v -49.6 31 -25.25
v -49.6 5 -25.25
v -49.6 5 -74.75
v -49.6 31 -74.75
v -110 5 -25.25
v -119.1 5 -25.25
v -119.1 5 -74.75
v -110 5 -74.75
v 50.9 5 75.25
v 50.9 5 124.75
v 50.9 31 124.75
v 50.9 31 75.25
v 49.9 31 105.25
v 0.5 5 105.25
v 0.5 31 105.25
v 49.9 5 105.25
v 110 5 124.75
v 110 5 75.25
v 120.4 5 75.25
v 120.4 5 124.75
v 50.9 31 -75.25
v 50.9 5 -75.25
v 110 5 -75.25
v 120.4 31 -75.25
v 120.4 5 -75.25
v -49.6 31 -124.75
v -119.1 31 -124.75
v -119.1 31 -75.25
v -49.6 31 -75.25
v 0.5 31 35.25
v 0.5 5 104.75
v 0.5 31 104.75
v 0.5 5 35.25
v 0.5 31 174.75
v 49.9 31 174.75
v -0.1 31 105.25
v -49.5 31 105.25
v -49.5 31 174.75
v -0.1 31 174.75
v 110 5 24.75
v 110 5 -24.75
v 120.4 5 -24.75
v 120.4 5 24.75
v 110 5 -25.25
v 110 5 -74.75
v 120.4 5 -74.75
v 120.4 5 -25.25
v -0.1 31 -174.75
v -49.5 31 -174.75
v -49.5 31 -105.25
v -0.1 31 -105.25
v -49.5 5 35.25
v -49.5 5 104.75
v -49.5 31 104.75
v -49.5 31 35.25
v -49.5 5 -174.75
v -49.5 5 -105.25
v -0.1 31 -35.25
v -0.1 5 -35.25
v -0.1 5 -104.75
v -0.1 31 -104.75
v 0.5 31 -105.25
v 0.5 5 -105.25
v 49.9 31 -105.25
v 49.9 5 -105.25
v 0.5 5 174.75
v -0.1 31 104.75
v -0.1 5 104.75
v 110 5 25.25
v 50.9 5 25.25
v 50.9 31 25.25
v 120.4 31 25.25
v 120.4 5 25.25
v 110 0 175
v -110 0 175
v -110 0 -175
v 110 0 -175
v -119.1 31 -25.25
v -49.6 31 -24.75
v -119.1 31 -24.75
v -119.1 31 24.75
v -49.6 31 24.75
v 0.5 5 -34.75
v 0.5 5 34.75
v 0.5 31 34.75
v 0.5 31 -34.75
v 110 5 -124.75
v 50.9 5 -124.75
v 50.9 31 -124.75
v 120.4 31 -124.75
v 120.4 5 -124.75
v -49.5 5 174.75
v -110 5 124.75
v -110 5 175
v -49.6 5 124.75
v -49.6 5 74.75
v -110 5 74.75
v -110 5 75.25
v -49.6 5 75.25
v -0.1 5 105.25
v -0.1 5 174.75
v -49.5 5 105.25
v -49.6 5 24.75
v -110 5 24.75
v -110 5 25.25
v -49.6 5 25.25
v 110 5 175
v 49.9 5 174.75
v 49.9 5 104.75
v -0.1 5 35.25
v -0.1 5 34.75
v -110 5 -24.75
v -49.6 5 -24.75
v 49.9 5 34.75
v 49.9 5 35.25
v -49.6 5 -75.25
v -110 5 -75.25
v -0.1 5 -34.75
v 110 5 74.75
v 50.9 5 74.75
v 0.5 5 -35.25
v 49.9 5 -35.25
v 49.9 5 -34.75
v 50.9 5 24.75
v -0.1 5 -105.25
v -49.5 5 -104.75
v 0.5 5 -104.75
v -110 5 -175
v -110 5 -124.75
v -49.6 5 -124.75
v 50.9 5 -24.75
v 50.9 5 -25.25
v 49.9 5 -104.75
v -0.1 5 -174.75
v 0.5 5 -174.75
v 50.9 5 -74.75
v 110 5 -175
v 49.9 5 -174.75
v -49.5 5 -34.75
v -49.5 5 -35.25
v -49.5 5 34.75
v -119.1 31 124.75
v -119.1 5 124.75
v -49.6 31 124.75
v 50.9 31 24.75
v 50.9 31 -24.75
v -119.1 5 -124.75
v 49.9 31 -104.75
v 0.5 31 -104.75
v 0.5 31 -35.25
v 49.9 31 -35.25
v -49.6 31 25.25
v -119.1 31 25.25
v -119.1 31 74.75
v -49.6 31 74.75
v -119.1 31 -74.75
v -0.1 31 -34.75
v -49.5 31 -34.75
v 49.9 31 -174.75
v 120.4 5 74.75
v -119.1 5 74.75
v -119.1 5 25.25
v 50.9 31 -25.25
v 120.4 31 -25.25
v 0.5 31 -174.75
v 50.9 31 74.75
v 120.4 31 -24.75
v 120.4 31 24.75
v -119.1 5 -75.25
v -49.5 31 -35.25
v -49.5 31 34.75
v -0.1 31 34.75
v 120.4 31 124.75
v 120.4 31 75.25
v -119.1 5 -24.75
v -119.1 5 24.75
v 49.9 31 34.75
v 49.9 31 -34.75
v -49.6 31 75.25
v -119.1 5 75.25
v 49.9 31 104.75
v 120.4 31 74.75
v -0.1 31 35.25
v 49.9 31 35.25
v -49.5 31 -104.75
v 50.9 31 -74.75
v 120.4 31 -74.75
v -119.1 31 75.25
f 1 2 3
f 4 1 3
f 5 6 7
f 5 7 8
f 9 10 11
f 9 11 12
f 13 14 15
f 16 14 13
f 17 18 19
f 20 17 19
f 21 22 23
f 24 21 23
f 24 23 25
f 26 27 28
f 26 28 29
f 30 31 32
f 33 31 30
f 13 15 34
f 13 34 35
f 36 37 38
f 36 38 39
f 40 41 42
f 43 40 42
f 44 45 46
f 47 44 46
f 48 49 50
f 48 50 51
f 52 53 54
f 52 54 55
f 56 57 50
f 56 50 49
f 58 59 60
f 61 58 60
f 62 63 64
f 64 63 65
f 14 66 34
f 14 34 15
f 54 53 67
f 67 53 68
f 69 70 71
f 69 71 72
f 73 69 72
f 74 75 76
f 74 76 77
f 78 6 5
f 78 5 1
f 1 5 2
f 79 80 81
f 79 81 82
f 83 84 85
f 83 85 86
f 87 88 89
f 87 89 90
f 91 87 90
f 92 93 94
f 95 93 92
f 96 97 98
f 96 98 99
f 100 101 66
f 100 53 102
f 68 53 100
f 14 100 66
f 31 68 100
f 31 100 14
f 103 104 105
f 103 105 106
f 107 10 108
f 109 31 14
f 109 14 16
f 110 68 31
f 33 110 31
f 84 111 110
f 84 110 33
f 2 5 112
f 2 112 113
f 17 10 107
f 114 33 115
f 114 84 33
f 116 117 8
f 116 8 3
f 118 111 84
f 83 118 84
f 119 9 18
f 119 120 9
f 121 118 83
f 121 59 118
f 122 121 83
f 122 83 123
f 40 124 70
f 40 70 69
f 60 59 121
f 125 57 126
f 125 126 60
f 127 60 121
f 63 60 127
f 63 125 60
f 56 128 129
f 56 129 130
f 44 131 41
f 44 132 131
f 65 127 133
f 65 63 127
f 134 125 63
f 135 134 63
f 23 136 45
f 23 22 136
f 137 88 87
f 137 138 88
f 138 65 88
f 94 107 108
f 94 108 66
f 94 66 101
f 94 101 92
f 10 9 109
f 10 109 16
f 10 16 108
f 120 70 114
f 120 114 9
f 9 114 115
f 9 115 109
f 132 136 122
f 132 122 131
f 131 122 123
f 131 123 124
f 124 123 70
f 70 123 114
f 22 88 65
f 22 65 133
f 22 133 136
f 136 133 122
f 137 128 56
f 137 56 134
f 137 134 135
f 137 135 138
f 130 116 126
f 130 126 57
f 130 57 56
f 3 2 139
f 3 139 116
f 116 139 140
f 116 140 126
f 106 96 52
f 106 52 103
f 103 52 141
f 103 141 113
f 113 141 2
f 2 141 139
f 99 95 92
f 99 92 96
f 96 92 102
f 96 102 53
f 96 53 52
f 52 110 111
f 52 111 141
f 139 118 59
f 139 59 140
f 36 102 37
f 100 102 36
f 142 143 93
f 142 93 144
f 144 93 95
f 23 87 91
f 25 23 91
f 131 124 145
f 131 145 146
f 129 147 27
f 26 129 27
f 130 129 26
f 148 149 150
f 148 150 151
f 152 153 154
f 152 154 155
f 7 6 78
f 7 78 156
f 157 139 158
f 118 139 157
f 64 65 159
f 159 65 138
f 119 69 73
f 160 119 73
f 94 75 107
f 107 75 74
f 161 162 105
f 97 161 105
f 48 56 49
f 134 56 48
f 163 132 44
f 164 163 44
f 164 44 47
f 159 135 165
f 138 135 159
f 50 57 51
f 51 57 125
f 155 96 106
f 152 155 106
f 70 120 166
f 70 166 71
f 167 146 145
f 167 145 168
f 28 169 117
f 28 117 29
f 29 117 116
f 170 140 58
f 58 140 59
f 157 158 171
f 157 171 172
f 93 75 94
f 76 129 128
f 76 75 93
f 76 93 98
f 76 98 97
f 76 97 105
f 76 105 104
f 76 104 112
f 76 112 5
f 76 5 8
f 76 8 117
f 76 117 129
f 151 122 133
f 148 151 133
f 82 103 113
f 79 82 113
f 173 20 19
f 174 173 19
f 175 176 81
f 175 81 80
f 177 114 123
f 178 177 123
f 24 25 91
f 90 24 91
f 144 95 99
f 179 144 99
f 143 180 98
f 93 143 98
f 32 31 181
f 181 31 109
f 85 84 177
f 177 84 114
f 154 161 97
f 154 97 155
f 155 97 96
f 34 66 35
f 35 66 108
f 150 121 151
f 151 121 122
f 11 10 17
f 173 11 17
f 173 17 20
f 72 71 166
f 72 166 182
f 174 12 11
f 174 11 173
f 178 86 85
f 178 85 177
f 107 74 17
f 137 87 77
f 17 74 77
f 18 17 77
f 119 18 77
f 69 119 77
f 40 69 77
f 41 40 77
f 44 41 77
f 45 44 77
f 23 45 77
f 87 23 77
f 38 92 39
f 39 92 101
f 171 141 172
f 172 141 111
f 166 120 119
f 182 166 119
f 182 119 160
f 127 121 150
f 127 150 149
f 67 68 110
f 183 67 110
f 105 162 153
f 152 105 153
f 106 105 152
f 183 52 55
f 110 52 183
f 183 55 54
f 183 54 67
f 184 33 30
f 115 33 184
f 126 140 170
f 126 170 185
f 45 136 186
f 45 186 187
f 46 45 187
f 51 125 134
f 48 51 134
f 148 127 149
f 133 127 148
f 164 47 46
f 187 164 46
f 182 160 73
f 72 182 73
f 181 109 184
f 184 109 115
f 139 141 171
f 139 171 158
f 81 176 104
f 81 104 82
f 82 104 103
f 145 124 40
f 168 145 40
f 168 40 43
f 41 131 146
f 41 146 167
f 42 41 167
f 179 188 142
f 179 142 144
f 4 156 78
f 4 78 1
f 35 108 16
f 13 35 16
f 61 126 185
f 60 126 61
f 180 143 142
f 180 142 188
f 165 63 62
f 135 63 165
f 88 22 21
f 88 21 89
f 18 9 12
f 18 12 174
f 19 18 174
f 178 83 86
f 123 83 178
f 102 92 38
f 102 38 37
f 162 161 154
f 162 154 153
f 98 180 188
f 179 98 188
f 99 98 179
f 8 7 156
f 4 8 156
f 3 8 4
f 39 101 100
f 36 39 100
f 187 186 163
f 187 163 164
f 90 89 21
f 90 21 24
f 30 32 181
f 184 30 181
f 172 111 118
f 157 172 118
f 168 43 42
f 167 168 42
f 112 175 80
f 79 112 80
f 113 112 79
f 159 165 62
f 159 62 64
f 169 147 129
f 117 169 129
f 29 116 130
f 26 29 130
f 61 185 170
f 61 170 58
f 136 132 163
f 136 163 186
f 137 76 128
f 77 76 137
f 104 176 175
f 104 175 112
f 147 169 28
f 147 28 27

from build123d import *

# Parameters (mm, degrees)
SKETCH1_W                     = 220
SKETCH1_H                     = 350
BOSS_EXTRUDE1_DEPTH           = 5
SKETCH2_W                     = 49.4
SKETCH2_H                     = 69.5
BOSS_EXTRUDE2_DEPTH           = 26
LPATTERN1_COUNT               = 2
LPATTERN1_PITCH               = 50
LPATTERN3_COUNT               = 3
LPATTERN3_PITCH               = 70
LPATTERN3_COPY_1_SKETCH_W     = 49.4
LPATTERN3_COPY_1_SKETCH_H     = 69.5
LPATTERN3_COPY_1_DEPTH        = 26
LPATTERN3_COPY_2_SKETCH_W     = 49.4
LPATTERN3_COPY_2_SKETCH_H     = 69.5
LPATTERN3_COPY_2_DEPTH        = 26
LPATTERN3_COL_COUNT           = 3
LPATTERN3_COL_PITCH           = 70
LPATTERN3_COL_COPY_1_SKETCH_W = 49.4
LPATTERN3_COL_COPY_1_SKETCH_H = 69.5
LPATTERN3_COL_COPY_1_DEPTH    = 26
LPATTERN3_COL_COPY_2_SKETCH_W = 49.4
LPATTERN3_COL_COPY_2_SKETCH_H = 69.5
LPATTERN3_COL_COPY_2_DEPTH    = 26
SKETCH4_W                     = 69.5
SKETCH4_H                     = 49.5
BOSS_EXTRUDE3_DEPTH           = 26
LPATTERN4_COUNT               = 3
LPATTERN4_PITCH               = 50
LPATTERN4_COL_COUNT           = 3
LPATTERN4_COL_PITCH           = 50
LPATTERN5_COUNT               = 2
LPATTERN5_PITCH               = 170
LPATTERN5_COPY_1_SKETCH_W     = 69.5
LPATTERN5_COPY_1_SKETCH_H     = 49.5
LPATTERN5_COPY_1_DEPTH        = 26
LPATTERN5_COPY_2_SKETCH_W     = 69.5
LPATTERN5_COPY_2_SKETCH_H     = 49.5
LPATTERN5_COPY_2_DEPTH        = 26
LPATTERN5_COPY_3_SKETCH_W     = 69.5
LPATTERN5_COPY_3_SKETCH_H     = 49.5
LPATTERN5_COPY_3_DEPTH        = 26
LPATTERN5_COPY_4_SKETCH_W     = 69.5
LPATTERN5_COPY_4_SKETCH_H     = 49.5
LPATTERN5_COPY_4_DEPTH        = 26


with BuildPart() as part:
    # Sketch1 → Boss-Extrude1 (new body)
    with BuildSketch(Plane(origin=(0, 0, 0), x_dir=(1, 0, 0), z_dir=(0, 1, 0))):
        Rectangle(SKETCH1_W, SKETCH1_H)
    extrude(amount=BOSS_EXTRUDE1_DEPTH)

    # Sketch2 → Boss-Extrude2 (add)
    with BuildSketch(Plane(origin=(0, 5, 0), x_dir=(1, 0, 0), z_dir=(0, 1, 0))):
        with Locations((-24.8, 0)):
            Rectangle(SKETCH2_W, SKETCH2_H)
    boss_extrude2 = extrude(amount=BOSS_EXTRUDE2_DEPTH)

    # LPattern1: Boss-Extrude2 ×2
    with Locations(*[(i * LPATTERN1_PITCH, 0, 0) for i in range(1, LPATTERN1_COUNT)]):
        add(boss_extrude2)

    # LPattern3: Boss-Extrude2 ×3
    with Locations(*[(0, 0, -i * LPATTERN3_PITCH) for i in range(1, LPATTERN3_COUNT)]):
        add(boss_extrude2)

    # LPattern3 copy 1 sketch → LPattern3 copy 1 (add)
    with BuildSketch(Plane(origin=(50, 5, -70), x_dir=(1, 0, 0), z_dir=(0, 1, 0))):
        with Locations((-24.8, 0)):
            Rectangle(LPATTERN3_COPY_1_SKETCH_W, LPATTERN3_COPY_1_SKETCH_H)
    extrude(amount=LPATTERN3_COPY_1_DEPTH)

    # LPattern3 copy 2 sketch → LPattern3 copy 2 (add)
    with BuildSketch(Plane(origin=(50, 5, -140), x_dir=(1, 0, 0), z_dir=(0, 1, 0))):
        with Locations((-24.8, 0)):
            Rectangle(LPATTERN3_COPY_2_SKETCH_W, LPATTERN3_COPY_2_SKETCH_H)
    extrude(amount=LPATTERN3_COPY_2_DEPTH)

    # LPattern3 col: Boss-Extrude2 ×3
    with Locations(*[(0, 0, i * LPATTERN3_COL_PITCH) for i in range(1, LPATTERN3_COL_COUNT)]):
        add(boss_extrude2)

    # LPattern3 col copy 1 sketch → LPattern3 col copy 1 (add)
    with BuildSketch(Plane(origin=(50, 5, 70), x_dir=(1, 0, 0), z_dir=(0, 1, 0))):
        with Locations((-24.8, 0)):
            Rectangle(LPATTERN3_COL_COPY_1_SKETCH_W, LPATTERN3_COL_COPY_1_SKETCH_H)
    extrude(amount=LPATTERN3_COL_COPY_1_DEPTH)

    # LPattern3 col copy 2 sketch → LPattern3 col copy 2 (add)
    with BuildSketch(Plane(origin=(50, 5, 140), x_dir=(1, 0, 0), z_dir=(0, 1, 0))):
        with Locations((-24.8, 0)):
            Rectangle(LPATTERN3_COL_COPY_2_SKETCH_W, LPATTERN3_COL_COPY_2_SKETCH_H)
    extrude(amount=LPATTERN3_COL_COPY_2_DEPTH)

    # Sketch4 → Boss-Extrude3 (add)
    with BuildSketch(Plane(origin=(0, 5, 0), x_dir=(1, 0, 0), z_dir=(0, 1, 0))):
        with Locations((-84.35, 0)):
            Rectangle(SKETCH4_W, SKETCH4_H)
    boss_extrude3 = extrude(amount=BOSS_EXTRUDE3_DEPTH)

    # LPattern4: Boss-Extrude3 ×3
    with Locations(*[(0, 0, i * LPATTERN4_PITCH) for i in range(1, LPATTERN4_COUNT)]):
        add(boss_extrude3)

    # LPattern4 col: Boss-Extrude3 ×3
    with Locations(*[(0, 0, -i * LPATTERN4_COL_PITCH) for i in range(1, LPATTERN4_COL_COUNT)]):
        add(boss_extrude3)

    # LPattern5: Boss-Extrude3 ×2
    with Locations(*[(i * LPATTERN5_PITCH, 0, 0) for i in range(1, LPATTERN5_COUNT)]):
        add(boss_extrude3)

    # LPattern5 copy 1 sketch → LPattern5 copy 1 (add)
    with BuildSketch(Plane(origin=(170, 5, 50), x_dir=(1, 0, 0), z_dir=(0, 1, 0))):
        with Locations((-84.35, 0)):
            Rectangle(LPATTERN5_COPY_1_SKETCH_W, LPATTERN5_COPY_1_SKETCH_H)
    extrude(amount=LPATTERN5_COPY_1_DEPTH)

    # LPattern5 copy 2 sketch → LPattern5 copy 2 (add)
    with BuildSketch(Plane(origin=(170, 5, 100), x_dir=(1, 0, 0), z_dir=(0, 1, 0))):
        with Locations((-84.35, 0)):
            Rectangle(LPATTERN5_COPY_2_SKETCH_W, LPATTERN5_COPY_2_SKETCH_H)
    extrude(amount=LPATTERN5_COPY_2_DEPTH)

    # LPattern5 copy 3 sketch → LPattern5 copy 3 (add)
    with BuildSketch(Plane(origin=(170, 5, -50), x_dir=(1, 0, 0), z_dir=(0, 1, 0))):
        with Locations((-84.35, 0)):
            Rectangle(LPATTERN5_COPY_3_SKETCH_W, LPATTERN5_COPY_3_SKETCH_H)
    extrude(amount=LPATTERN5_COPY_3_DEPTH)

    # LPattern5 copy 4 sketch → LPattern5 copy 4 (add)
    with BuildSketch(Plane(origin=(170, 5, -100), x_dir=(1, 0, 0), z_dir=(0, 1, 0))):
        with Locations((-84.35, 0)):
            Rectangle(LPATTERN5_COPY_4_SKETCH_W, LPATTERN5_COPY_4_SKETCH_H)
    extrude(amount=LPATTERN5_COPY_4_DEPTH)


solid = part.part
